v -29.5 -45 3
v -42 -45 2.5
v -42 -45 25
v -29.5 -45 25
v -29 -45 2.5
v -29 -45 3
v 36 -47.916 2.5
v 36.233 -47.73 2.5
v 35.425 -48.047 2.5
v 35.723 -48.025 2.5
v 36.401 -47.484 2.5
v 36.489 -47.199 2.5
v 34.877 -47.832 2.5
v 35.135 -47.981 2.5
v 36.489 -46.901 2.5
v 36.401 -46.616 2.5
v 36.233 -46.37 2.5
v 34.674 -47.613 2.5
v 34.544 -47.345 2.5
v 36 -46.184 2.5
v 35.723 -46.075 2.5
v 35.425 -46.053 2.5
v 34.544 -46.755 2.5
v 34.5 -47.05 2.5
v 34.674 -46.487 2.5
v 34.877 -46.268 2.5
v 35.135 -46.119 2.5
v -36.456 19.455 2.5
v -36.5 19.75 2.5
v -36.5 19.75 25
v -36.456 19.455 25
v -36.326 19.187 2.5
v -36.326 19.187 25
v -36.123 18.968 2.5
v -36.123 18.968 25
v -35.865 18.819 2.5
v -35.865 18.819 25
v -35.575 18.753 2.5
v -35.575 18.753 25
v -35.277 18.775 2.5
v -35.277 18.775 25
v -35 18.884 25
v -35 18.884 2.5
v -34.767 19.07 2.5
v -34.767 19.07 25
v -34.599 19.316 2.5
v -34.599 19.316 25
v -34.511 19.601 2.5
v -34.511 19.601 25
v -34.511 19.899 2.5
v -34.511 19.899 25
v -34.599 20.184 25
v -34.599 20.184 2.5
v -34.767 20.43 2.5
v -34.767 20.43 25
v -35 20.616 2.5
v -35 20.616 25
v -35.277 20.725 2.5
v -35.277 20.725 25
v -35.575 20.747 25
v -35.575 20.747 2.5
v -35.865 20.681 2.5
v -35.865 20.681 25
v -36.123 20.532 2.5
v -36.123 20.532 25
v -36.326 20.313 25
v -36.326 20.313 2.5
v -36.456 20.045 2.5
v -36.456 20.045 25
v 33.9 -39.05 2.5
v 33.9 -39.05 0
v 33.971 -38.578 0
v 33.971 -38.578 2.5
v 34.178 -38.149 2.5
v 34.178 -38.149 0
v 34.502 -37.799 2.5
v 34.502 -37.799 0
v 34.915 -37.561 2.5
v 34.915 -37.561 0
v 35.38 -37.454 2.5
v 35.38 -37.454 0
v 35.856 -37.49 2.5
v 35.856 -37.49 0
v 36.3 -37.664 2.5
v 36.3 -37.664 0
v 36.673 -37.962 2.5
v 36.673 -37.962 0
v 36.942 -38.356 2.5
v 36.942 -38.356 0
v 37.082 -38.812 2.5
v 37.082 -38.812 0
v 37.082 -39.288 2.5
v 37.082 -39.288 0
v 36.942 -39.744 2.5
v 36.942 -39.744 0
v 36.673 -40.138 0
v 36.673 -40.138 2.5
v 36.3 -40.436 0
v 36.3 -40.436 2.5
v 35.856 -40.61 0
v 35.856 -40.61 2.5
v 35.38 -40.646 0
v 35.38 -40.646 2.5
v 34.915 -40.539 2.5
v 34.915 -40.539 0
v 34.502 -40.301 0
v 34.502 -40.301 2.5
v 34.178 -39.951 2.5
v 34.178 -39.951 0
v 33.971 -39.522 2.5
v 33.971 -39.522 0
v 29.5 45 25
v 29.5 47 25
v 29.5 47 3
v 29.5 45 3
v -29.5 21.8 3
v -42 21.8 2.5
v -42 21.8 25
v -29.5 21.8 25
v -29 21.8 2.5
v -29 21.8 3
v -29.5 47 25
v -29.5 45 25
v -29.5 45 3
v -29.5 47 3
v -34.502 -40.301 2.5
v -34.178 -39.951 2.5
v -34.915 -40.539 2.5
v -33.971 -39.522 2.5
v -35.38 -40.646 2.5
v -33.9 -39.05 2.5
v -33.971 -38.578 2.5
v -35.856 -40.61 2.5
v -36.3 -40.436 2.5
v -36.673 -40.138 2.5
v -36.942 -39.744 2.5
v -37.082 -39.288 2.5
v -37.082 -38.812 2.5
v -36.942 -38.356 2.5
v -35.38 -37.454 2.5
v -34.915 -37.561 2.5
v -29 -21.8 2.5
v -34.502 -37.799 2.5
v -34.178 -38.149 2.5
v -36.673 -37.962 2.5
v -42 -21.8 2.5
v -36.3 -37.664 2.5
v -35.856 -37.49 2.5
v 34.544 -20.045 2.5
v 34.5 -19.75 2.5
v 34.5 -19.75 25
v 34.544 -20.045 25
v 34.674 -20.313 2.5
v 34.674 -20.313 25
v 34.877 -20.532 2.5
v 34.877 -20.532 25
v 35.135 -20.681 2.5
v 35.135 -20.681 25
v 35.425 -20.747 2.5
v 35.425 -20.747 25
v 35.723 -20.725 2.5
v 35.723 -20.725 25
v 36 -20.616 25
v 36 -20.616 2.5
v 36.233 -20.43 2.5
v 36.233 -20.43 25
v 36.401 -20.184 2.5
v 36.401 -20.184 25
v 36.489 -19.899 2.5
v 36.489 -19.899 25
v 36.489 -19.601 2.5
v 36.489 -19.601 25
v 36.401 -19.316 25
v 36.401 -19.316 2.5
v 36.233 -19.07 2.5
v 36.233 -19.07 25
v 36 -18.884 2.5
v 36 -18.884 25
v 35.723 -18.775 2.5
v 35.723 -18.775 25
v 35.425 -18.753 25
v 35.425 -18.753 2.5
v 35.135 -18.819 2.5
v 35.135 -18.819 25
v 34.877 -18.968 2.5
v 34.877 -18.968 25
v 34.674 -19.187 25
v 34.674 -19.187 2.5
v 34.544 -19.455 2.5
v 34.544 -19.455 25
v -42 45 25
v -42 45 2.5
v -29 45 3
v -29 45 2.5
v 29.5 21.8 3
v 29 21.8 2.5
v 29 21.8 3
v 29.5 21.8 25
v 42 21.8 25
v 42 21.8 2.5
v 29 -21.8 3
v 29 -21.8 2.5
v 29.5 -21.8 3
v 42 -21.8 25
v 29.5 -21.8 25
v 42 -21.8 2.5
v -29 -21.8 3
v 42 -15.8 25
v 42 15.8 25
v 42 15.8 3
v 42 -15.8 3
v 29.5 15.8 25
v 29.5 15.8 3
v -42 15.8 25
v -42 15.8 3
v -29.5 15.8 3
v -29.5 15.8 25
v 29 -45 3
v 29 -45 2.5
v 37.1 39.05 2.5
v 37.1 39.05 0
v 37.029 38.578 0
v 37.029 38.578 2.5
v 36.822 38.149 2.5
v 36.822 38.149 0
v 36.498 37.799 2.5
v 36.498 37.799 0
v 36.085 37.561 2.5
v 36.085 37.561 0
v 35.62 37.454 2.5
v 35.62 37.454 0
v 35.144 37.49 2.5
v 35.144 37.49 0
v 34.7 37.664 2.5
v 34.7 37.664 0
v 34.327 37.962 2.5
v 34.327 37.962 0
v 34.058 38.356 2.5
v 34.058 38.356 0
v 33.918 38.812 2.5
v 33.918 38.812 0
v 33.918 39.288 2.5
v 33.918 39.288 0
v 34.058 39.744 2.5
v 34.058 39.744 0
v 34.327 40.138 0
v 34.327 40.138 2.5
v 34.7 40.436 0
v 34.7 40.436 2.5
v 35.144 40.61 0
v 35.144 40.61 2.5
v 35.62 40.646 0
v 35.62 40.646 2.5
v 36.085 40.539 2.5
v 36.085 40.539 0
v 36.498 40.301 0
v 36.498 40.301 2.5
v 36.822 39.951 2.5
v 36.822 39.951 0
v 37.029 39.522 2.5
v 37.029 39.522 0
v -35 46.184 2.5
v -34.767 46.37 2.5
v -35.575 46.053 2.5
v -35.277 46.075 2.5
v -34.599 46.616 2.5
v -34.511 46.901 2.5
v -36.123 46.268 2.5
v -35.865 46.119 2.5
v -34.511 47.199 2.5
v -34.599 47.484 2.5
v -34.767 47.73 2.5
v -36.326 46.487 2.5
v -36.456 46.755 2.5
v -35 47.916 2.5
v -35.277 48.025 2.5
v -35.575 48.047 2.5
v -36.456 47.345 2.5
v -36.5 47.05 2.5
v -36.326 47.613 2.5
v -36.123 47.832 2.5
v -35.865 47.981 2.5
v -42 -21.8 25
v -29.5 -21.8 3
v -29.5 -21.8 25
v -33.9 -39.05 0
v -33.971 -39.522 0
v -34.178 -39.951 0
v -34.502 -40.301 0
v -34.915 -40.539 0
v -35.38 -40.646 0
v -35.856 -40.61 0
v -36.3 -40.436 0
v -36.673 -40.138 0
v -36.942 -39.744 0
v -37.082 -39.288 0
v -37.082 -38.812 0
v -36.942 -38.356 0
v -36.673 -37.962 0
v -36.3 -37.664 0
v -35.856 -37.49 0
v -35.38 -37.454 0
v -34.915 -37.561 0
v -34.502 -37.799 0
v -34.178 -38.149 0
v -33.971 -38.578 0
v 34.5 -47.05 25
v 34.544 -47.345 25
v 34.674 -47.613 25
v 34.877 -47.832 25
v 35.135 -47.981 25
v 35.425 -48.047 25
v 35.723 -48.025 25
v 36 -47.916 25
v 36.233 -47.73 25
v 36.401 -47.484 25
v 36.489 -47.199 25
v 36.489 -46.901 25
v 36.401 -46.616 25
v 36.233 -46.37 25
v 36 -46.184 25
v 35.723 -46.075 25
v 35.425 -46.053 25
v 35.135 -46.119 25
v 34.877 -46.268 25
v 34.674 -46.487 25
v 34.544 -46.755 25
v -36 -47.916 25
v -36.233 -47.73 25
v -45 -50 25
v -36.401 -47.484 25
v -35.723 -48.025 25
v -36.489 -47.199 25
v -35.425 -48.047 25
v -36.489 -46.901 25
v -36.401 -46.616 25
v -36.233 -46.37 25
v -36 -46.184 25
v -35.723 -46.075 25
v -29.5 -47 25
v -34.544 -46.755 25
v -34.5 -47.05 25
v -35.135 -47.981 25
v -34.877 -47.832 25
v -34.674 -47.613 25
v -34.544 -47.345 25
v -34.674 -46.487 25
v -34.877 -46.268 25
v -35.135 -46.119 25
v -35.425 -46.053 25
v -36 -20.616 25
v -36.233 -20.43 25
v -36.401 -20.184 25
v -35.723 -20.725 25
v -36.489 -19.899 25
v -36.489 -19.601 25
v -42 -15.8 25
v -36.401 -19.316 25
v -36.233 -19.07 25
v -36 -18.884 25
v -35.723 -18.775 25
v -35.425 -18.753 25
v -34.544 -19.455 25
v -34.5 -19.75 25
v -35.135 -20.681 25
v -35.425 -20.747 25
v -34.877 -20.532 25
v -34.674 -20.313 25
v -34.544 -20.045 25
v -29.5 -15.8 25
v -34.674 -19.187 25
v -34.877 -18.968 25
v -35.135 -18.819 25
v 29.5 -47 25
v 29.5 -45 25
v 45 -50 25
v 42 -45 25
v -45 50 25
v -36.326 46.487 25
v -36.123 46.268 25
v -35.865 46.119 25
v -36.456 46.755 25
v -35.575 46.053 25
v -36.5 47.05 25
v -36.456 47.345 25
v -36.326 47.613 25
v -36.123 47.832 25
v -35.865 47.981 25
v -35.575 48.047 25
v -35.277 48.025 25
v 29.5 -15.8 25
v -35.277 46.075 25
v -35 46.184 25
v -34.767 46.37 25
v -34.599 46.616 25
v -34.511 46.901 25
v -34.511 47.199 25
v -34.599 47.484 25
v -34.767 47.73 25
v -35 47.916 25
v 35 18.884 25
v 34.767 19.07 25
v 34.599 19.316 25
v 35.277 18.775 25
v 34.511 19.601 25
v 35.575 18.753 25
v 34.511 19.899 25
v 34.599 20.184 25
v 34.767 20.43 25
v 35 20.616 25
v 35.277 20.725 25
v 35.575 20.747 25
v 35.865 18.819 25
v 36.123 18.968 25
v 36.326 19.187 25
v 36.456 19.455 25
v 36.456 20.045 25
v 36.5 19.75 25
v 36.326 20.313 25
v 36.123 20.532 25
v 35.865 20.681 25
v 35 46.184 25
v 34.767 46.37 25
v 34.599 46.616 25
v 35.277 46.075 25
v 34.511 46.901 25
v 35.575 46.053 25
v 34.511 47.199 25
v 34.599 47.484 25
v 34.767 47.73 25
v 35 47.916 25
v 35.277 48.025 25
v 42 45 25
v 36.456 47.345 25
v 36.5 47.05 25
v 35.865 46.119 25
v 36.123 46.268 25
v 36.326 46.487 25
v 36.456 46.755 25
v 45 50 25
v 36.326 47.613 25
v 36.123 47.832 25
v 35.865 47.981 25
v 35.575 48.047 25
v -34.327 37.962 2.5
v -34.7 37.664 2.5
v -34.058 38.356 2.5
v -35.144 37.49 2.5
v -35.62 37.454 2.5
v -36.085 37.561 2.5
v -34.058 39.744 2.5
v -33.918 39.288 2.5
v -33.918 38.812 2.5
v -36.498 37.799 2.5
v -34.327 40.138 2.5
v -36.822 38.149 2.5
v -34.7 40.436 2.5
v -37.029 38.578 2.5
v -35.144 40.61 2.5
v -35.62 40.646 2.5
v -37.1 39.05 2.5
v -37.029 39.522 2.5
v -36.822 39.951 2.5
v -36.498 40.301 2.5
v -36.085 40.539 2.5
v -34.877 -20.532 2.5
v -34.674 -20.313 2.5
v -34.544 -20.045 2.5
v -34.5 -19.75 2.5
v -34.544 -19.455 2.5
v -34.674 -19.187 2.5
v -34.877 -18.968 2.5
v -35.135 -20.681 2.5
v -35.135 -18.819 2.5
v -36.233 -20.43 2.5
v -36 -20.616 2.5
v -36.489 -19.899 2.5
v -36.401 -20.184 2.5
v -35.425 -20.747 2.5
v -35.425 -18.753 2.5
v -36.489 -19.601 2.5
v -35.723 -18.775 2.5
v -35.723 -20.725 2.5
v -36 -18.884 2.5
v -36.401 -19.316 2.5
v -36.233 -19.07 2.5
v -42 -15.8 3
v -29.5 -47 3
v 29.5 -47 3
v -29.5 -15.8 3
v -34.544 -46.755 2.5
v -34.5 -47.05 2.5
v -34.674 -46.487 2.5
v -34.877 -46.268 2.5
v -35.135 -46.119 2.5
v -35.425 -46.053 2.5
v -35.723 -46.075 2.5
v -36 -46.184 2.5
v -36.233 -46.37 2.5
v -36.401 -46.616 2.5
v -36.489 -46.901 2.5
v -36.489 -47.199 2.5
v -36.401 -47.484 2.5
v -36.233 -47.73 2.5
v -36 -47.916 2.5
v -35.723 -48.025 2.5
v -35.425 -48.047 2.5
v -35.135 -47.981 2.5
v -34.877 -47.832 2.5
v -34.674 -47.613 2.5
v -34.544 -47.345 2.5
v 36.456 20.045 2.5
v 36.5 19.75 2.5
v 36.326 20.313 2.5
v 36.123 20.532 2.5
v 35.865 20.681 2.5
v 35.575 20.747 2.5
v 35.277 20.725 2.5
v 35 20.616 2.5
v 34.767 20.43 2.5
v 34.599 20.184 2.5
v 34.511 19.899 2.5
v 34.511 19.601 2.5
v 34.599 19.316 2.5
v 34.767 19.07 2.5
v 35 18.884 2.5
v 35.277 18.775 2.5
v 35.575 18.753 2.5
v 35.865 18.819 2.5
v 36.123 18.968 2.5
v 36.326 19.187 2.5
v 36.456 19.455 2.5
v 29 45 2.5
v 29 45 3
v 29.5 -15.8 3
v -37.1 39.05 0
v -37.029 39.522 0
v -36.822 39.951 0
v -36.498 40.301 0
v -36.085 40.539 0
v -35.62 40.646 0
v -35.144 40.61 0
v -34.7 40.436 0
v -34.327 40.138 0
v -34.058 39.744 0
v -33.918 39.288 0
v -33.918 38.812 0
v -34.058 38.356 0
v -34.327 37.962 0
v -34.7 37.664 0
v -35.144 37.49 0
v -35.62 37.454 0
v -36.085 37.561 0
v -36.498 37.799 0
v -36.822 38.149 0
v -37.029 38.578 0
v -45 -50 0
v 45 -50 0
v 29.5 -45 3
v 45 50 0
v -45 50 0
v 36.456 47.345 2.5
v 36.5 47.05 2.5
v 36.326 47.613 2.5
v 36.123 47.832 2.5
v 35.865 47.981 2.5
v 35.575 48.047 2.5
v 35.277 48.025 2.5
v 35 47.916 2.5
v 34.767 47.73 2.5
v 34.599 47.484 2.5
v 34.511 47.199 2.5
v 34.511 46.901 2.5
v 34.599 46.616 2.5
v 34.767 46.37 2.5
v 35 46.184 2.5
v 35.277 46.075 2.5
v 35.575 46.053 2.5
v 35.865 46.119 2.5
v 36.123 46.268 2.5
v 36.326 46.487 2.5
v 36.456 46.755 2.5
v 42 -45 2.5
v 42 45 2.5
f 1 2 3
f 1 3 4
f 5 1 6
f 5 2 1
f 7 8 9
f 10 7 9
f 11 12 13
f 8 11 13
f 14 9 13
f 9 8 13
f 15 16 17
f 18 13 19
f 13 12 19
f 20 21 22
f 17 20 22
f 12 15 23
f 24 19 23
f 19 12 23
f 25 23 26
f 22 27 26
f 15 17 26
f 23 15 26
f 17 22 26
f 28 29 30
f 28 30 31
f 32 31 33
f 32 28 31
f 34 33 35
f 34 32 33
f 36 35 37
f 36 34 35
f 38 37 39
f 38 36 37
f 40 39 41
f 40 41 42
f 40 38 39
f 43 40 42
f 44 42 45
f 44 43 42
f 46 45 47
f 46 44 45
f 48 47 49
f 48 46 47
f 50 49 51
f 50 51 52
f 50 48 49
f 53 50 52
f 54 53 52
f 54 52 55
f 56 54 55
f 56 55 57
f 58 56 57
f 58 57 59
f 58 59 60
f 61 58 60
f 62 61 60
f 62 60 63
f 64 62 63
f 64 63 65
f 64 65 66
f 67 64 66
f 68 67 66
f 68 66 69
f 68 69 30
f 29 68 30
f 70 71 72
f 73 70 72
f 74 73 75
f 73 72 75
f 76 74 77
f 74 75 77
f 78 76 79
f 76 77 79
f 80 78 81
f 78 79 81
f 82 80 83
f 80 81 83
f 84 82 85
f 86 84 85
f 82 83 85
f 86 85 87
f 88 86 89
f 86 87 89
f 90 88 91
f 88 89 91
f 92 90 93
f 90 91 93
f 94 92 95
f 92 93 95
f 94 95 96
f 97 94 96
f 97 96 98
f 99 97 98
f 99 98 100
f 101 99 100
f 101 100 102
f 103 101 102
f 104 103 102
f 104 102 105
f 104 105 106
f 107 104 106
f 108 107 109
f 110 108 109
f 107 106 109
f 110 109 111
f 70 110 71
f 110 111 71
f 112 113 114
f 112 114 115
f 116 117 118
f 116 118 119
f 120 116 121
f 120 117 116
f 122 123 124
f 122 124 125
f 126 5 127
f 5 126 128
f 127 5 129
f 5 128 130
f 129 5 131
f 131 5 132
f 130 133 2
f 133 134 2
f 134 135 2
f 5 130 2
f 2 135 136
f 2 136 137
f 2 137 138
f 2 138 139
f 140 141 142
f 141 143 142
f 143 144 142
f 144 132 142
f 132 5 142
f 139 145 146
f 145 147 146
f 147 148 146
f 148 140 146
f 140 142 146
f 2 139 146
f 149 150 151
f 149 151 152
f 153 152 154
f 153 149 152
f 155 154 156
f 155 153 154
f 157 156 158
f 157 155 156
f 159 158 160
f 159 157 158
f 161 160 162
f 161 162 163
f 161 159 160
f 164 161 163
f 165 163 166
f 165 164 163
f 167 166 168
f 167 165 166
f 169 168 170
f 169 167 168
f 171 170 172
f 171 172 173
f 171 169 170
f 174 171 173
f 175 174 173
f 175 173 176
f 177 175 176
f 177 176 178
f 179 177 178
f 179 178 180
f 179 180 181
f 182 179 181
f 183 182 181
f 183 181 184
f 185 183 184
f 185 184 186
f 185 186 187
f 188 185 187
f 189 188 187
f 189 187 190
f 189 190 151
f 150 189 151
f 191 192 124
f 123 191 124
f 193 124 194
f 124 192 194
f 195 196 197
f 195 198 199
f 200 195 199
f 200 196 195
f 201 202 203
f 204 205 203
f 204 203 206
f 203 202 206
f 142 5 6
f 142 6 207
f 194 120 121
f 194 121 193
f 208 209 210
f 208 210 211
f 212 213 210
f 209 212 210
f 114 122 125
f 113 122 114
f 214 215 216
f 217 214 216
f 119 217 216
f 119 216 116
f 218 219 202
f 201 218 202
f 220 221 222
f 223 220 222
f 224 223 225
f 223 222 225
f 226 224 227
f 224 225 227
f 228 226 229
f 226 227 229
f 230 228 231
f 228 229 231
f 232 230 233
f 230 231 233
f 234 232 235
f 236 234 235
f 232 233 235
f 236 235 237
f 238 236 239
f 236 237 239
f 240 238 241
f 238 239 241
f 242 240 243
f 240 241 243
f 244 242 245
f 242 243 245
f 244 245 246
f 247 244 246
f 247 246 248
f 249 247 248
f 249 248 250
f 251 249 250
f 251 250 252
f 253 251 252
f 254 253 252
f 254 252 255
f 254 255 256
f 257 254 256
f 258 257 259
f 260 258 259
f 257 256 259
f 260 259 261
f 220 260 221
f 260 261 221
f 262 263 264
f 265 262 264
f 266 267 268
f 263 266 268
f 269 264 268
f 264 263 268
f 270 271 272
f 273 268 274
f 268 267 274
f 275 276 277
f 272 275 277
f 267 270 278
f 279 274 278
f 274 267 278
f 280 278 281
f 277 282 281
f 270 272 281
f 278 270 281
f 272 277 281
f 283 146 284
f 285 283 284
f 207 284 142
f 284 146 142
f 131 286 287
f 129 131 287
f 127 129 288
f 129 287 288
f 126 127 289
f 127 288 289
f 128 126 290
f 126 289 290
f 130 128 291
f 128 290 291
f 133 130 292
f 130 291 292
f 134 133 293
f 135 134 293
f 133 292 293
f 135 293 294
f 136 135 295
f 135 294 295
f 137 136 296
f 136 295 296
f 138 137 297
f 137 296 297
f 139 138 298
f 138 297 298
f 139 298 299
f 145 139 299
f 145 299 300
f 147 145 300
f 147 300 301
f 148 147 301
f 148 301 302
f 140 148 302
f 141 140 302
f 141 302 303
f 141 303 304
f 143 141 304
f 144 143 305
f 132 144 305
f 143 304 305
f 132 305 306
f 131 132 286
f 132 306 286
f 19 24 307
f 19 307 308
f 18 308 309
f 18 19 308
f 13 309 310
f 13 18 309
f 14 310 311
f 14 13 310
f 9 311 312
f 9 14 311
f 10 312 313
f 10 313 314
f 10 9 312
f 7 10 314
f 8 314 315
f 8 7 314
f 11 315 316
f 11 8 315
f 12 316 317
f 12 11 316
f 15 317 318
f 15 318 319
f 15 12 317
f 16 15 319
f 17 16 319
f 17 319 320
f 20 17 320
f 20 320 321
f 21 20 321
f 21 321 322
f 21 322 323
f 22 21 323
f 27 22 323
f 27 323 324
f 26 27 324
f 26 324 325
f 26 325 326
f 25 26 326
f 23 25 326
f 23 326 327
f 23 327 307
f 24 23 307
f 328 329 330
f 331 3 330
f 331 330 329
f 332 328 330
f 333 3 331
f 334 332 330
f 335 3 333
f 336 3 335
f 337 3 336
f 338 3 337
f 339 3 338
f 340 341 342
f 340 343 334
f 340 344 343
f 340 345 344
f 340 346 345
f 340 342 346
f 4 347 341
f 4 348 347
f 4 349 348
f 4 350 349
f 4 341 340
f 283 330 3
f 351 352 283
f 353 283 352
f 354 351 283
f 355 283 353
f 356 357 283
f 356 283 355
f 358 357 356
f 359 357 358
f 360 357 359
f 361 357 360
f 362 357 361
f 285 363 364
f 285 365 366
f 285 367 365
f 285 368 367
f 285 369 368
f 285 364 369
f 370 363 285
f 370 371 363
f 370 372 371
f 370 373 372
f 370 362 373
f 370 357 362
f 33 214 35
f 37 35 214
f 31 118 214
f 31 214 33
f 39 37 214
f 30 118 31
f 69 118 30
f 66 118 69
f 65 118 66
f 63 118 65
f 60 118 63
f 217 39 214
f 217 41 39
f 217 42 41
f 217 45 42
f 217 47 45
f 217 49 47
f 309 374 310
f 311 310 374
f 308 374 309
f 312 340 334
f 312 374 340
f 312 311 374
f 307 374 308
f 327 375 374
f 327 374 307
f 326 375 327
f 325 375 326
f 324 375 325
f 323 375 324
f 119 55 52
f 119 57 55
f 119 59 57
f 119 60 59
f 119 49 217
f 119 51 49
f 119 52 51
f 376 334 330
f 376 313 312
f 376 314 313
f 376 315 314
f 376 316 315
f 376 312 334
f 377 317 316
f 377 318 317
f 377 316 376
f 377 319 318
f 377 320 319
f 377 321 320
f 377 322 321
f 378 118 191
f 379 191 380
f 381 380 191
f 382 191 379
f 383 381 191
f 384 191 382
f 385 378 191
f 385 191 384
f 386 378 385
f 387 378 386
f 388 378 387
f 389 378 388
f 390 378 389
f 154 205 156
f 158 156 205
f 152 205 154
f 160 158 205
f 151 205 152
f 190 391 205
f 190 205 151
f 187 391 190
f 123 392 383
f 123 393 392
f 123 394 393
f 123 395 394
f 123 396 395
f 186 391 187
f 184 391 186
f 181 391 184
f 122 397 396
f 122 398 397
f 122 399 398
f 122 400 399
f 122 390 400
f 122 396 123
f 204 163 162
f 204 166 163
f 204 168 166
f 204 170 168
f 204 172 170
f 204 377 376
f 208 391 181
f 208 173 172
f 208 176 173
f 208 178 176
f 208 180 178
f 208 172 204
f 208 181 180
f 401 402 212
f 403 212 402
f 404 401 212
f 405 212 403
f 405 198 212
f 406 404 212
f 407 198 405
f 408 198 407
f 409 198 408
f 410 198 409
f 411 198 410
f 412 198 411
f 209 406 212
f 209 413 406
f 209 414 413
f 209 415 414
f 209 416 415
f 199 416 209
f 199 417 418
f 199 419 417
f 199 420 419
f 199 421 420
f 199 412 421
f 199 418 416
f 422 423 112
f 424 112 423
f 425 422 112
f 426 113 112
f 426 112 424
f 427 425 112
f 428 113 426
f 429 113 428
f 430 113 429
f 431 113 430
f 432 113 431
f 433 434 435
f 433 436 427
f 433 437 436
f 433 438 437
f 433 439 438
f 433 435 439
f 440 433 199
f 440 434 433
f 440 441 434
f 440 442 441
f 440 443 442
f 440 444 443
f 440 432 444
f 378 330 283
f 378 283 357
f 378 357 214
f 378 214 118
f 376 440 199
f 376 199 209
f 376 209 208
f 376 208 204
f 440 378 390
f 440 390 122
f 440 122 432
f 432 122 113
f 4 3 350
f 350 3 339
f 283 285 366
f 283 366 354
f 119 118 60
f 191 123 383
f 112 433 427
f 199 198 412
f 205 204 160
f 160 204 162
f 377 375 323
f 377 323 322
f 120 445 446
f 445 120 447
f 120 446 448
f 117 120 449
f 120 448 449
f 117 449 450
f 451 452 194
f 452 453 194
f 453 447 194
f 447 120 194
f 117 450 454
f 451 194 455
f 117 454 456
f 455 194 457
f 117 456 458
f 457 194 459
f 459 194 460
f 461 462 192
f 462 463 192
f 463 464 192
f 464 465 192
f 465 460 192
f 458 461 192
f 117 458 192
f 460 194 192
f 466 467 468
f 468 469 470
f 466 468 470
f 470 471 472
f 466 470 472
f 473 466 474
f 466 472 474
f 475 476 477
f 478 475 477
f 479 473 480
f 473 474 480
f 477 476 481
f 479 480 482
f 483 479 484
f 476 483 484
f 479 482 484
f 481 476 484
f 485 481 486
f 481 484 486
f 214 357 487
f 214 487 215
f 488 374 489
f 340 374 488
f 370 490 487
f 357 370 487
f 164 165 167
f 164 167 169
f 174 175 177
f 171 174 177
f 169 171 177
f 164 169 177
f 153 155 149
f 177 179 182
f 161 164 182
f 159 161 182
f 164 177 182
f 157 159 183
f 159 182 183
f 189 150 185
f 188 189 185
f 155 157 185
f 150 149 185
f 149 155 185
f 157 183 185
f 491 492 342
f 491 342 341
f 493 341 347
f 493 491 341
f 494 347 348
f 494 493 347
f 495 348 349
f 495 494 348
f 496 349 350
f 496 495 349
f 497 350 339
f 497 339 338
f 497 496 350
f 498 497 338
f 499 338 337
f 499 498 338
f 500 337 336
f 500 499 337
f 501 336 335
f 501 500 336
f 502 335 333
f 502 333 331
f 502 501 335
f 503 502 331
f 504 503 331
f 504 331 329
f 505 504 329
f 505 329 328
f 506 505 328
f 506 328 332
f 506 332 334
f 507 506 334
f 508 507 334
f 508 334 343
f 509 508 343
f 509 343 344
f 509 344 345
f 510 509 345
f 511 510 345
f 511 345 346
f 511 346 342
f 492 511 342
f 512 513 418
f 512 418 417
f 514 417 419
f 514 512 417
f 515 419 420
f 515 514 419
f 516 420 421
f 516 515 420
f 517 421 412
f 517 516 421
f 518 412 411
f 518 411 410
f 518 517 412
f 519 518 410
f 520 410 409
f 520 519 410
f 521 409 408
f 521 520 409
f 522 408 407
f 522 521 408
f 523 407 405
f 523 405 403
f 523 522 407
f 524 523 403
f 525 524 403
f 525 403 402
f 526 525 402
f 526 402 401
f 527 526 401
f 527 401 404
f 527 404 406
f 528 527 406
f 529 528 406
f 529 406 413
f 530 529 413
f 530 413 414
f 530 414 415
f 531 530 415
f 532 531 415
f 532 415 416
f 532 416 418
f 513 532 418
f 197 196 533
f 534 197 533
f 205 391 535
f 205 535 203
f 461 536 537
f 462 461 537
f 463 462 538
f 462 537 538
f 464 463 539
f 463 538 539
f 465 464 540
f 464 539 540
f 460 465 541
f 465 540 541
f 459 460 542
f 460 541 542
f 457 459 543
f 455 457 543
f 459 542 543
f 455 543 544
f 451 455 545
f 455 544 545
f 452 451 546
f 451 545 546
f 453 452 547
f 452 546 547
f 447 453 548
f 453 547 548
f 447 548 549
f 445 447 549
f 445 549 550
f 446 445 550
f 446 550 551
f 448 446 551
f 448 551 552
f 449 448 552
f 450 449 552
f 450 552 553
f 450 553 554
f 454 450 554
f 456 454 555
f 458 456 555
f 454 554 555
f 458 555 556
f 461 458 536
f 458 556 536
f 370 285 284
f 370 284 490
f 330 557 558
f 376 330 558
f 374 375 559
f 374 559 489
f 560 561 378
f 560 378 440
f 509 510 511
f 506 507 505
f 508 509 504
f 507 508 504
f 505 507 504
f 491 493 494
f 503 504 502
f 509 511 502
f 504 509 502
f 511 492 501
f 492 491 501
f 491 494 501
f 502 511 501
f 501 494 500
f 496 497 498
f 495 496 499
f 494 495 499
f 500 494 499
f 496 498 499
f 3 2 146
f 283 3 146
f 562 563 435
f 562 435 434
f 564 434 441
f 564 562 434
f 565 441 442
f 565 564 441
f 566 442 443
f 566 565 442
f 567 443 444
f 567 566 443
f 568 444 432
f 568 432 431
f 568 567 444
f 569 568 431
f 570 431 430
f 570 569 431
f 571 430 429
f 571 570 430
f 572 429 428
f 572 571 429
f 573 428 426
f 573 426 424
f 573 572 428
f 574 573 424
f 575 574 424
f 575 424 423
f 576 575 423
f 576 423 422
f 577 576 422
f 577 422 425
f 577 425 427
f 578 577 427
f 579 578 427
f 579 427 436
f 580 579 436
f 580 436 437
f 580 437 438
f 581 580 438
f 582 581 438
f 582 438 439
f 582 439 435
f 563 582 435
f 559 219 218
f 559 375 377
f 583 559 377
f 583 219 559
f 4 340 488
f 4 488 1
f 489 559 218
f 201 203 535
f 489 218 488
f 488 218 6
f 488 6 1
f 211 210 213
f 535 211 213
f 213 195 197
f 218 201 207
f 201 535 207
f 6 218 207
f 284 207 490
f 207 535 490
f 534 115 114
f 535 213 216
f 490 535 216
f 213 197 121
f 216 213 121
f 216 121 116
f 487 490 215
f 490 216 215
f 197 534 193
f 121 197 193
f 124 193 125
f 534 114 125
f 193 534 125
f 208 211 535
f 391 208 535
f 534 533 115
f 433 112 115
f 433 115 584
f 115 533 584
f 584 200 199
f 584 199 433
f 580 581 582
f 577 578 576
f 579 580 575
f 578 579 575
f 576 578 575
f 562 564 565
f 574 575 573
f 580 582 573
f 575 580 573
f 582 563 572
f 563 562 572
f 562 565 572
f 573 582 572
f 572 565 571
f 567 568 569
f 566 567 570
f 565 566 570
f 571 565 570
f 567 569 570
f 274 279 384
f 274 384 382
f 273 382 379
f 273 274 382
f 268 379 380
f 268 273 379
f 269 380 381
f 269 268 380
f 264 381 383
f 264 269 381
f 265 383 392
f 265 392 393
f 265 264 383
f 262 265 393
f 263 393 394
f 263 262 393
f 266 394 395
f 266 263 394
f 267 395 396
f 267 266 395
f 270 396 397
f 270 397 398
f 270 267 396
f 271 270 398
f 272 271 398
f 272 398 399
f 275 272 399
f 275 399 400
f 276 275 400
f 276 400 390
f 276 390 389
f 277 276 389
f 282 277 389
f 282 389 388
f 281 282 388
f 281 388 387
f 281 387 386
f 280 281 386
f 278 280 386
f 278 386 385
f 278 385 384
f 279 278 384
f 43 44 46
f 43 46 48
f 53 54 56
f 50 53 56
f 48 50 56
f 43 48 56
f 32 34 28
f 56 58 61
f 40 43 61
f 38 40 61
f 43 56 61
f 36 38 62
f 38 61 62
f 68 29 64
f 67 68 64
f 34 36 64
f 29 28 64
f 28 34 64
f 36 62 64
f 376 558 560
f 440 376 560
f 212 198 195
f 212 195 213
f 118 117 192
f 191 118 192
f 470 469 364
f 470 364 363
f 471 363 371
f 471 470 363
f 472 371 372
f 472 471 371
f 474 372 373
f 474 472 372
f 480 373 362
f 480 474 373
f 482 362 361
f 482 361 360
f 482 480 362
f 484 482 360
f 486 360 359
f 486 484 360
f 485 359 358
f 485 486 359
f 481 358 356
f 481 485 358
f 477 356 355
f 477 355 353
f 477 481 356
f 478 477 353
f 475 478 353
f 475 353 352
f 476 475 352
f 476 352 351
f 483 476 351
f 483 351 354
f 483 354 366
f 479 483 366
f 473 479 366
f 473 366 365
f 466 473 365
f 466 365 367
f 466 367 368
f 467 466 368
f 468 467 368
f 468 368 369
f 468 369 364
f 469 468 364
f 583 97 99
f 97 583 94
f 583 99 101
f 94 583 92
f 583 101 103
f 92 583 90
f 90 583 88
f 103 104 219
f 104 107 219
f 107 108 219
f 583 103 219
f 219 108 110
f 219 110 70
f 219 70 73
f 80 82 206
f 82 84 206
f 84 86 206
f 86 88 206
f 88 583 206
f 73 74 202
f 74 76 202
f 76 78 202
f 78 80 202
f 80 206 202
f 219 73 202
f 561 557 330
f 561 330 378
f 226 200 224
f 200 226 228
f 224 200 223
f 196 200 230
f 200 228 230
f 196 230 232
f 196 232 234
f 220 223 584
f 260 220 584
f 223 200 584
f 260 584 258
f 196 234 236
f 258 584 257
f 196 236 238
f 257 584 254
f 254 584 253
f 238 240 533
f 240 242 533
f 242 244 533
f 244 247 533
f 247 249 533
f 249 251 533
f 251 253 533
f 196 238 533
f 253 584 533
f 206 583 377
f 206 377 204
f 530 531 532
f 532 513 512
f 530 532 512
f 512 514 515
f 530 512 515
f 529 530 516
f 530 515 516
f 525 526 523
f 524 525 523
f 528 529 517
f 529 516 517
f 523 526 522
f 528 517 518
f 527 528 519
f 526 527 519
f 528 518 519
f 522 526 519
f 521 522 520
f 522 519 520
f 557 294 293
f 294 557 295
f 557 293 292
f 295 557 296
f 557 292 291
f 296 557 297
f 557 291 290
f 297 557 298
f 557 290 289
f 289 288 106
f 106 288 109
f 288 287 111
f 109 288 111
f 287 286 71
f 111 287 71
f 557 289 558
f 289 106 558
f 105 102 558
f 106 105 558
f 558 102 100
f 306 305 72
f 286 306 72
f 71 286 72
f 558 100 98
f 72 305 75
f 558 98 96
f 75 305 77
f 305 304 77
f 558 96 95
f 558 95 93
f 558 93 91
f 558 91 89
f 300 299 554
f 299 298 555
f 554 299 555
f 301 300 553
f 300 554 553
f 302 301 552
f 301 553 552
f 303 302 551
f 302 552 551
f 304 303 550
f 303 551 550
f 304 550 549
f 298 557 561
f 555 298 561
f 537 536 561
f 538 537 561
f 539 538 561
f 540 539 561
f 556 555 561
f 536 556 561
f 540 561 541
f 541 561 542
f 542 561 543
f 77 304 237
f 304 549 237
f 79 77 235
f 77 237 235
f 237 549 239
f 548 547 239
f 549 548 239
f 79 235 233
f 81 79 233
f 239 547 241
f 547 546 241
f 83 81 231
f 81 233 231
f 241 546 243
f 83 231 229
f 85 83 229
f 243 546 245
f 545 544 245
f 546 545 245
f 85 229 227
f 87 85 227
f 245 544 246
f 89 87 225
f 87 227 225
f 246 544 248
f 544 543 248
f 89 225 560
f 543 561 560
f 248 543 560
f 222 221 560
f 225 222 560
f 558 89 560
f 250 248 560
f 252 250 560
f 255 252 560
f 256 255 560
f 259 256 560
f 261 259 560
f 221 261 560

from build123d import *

# Parameters (mm, degrees)
ESBO_O1_W                = 90
ESBO_O1_H                = 100
ESBO_O1_R                = 1
ESBO_O1_W_2              = 13
ESBO_O1_H_2              = 23.2
RESSALTO_EXTRUS_O1_DEPTH = 25
CORTE_EXTRUS_O1_DEPTH    = 22
ESBO_O4_W                = 90
ESBO_O4_H                = 100
ESBO_O4_R                = 1.6
RESSALTO_EXTRUS_O2_DEPTH = 2.5


with BuildPart() as part:
    # Esboço1 → Ressalto-extrusão1 (new body)
    with BuildSketch(Plane.XY):
        Rectangle(ESBO_O1_W, ESBO_O1_H)
        with Locations((35.5, 19.75)):
            Circle(ESBO_O1_R, mode=Mode.SUBTRACT)
        with Locations((35.5, 47.05)):
            Circle(ESBO_O1_R, mode=Mode.SUBTRACT)
        with Locations(Location((35.5, -47.05, 0), (0, 0, 180))):
            Circle(ESBO_O1_R, mode=Mode.SUBTRACT)
        with Locations(Location((35.5, -19.75, 0), (0, 0, 180))):
            Circle(ESBO_O1_R, mode=Mode.SUBTRACT)
        with Locations((-35.5, -19.75)):
            Circle(ESBO_O1_R, mode=Mode.SUBTRACT)
        with Locations((-35.5, -47.05)):
            Circle(ESBO_O1_R, mode=Mode.SUBTRACT)
        with Locations(Location((-35.5, 47.05, 0), (0, 0, 180))):
            Circle(ESBO_O1_R, mode=Mode.SUBTRACT)
        with Locations(Location((-35.5, 19.75, 0), (0, 0, 180))):
            Circle(ESBO_O1_R, mode=Mode.SUBTRACT)
        with Locations((35.5, 33.4)):
            Rectangle(ESBO_O1_W_2, ESBO_O1_H_2, mode=Mode.SUBTRACT)
        with Locations((35.5, -33.4)):
            Rectangle(ESBO_O1_W_2, ESBO_O1_H_2, mode=Mode.SUBTRACT)
        with Locations((-35.5, -33.4)):
            Rectangle(ESBO_O1_W_2, ESBO_O1_H_2, mode=Mode.SUBTRACT)
        with Locations((-35.5, 33.4)):
            Rectangle(ESBO_O1_W_2, ESBO_O1_H_2, mode=Mode.SUBTRACT)
    extrude(amount=RESSALTO_EXTRUS_O1_DEPTH)

    # Esboço3 → Corte-extrusão1 (cut)
    with BuildSketch(Plane.XY.offset(25)):
        Polygon((-29.5, 47), (29.5, 47), (29.5, 15.8), (42, 15.8), (42, -15.8), (29.5, -15.8), (29.5, -47), (-29.5, -47), (-29.5, -15.8), (-42, -15.8), (-42, 15.8), (-29.5, 15.8), align=None)
    extrude(amount=-CORTE_EXTRUS_O1_DEPTH, mode=Mode.SUBTRACT)

    # Esboço4 → Ressalto-extrusão2 (add)
    with BuildSketch(Plane(origin=(0, 0, 0), x_dir=(-1, 0, 0), z_dir=(0, 0, -1))):
        Rectangle(ESBO_O4_W, ESBO_O4_H)
        with Locations((-35.5, -39.05)):
            Circle(ESBO_O4_R, mode=Mode.SUBTRACT)
        with Locations(Location((-35.5, 39.05, 0), (0, 0, 180))):
            Circle(ESBO_O4_R, mode=Mode.SUBTRACT)
        with Locations((35.5, 39.05)):
            Circle(ESBO_O4_R, mode=Mode.SUBTRACT)
        with Locations(Location((35.5, -39.05, 0), (0, 0, 180))):
            Circle(ESBO_O4_R, mode=Mode.SUBTRACT)
    extrude(amount=-RESSALTO_EXTRUS_O2_DEPTH)


solid = part.part
